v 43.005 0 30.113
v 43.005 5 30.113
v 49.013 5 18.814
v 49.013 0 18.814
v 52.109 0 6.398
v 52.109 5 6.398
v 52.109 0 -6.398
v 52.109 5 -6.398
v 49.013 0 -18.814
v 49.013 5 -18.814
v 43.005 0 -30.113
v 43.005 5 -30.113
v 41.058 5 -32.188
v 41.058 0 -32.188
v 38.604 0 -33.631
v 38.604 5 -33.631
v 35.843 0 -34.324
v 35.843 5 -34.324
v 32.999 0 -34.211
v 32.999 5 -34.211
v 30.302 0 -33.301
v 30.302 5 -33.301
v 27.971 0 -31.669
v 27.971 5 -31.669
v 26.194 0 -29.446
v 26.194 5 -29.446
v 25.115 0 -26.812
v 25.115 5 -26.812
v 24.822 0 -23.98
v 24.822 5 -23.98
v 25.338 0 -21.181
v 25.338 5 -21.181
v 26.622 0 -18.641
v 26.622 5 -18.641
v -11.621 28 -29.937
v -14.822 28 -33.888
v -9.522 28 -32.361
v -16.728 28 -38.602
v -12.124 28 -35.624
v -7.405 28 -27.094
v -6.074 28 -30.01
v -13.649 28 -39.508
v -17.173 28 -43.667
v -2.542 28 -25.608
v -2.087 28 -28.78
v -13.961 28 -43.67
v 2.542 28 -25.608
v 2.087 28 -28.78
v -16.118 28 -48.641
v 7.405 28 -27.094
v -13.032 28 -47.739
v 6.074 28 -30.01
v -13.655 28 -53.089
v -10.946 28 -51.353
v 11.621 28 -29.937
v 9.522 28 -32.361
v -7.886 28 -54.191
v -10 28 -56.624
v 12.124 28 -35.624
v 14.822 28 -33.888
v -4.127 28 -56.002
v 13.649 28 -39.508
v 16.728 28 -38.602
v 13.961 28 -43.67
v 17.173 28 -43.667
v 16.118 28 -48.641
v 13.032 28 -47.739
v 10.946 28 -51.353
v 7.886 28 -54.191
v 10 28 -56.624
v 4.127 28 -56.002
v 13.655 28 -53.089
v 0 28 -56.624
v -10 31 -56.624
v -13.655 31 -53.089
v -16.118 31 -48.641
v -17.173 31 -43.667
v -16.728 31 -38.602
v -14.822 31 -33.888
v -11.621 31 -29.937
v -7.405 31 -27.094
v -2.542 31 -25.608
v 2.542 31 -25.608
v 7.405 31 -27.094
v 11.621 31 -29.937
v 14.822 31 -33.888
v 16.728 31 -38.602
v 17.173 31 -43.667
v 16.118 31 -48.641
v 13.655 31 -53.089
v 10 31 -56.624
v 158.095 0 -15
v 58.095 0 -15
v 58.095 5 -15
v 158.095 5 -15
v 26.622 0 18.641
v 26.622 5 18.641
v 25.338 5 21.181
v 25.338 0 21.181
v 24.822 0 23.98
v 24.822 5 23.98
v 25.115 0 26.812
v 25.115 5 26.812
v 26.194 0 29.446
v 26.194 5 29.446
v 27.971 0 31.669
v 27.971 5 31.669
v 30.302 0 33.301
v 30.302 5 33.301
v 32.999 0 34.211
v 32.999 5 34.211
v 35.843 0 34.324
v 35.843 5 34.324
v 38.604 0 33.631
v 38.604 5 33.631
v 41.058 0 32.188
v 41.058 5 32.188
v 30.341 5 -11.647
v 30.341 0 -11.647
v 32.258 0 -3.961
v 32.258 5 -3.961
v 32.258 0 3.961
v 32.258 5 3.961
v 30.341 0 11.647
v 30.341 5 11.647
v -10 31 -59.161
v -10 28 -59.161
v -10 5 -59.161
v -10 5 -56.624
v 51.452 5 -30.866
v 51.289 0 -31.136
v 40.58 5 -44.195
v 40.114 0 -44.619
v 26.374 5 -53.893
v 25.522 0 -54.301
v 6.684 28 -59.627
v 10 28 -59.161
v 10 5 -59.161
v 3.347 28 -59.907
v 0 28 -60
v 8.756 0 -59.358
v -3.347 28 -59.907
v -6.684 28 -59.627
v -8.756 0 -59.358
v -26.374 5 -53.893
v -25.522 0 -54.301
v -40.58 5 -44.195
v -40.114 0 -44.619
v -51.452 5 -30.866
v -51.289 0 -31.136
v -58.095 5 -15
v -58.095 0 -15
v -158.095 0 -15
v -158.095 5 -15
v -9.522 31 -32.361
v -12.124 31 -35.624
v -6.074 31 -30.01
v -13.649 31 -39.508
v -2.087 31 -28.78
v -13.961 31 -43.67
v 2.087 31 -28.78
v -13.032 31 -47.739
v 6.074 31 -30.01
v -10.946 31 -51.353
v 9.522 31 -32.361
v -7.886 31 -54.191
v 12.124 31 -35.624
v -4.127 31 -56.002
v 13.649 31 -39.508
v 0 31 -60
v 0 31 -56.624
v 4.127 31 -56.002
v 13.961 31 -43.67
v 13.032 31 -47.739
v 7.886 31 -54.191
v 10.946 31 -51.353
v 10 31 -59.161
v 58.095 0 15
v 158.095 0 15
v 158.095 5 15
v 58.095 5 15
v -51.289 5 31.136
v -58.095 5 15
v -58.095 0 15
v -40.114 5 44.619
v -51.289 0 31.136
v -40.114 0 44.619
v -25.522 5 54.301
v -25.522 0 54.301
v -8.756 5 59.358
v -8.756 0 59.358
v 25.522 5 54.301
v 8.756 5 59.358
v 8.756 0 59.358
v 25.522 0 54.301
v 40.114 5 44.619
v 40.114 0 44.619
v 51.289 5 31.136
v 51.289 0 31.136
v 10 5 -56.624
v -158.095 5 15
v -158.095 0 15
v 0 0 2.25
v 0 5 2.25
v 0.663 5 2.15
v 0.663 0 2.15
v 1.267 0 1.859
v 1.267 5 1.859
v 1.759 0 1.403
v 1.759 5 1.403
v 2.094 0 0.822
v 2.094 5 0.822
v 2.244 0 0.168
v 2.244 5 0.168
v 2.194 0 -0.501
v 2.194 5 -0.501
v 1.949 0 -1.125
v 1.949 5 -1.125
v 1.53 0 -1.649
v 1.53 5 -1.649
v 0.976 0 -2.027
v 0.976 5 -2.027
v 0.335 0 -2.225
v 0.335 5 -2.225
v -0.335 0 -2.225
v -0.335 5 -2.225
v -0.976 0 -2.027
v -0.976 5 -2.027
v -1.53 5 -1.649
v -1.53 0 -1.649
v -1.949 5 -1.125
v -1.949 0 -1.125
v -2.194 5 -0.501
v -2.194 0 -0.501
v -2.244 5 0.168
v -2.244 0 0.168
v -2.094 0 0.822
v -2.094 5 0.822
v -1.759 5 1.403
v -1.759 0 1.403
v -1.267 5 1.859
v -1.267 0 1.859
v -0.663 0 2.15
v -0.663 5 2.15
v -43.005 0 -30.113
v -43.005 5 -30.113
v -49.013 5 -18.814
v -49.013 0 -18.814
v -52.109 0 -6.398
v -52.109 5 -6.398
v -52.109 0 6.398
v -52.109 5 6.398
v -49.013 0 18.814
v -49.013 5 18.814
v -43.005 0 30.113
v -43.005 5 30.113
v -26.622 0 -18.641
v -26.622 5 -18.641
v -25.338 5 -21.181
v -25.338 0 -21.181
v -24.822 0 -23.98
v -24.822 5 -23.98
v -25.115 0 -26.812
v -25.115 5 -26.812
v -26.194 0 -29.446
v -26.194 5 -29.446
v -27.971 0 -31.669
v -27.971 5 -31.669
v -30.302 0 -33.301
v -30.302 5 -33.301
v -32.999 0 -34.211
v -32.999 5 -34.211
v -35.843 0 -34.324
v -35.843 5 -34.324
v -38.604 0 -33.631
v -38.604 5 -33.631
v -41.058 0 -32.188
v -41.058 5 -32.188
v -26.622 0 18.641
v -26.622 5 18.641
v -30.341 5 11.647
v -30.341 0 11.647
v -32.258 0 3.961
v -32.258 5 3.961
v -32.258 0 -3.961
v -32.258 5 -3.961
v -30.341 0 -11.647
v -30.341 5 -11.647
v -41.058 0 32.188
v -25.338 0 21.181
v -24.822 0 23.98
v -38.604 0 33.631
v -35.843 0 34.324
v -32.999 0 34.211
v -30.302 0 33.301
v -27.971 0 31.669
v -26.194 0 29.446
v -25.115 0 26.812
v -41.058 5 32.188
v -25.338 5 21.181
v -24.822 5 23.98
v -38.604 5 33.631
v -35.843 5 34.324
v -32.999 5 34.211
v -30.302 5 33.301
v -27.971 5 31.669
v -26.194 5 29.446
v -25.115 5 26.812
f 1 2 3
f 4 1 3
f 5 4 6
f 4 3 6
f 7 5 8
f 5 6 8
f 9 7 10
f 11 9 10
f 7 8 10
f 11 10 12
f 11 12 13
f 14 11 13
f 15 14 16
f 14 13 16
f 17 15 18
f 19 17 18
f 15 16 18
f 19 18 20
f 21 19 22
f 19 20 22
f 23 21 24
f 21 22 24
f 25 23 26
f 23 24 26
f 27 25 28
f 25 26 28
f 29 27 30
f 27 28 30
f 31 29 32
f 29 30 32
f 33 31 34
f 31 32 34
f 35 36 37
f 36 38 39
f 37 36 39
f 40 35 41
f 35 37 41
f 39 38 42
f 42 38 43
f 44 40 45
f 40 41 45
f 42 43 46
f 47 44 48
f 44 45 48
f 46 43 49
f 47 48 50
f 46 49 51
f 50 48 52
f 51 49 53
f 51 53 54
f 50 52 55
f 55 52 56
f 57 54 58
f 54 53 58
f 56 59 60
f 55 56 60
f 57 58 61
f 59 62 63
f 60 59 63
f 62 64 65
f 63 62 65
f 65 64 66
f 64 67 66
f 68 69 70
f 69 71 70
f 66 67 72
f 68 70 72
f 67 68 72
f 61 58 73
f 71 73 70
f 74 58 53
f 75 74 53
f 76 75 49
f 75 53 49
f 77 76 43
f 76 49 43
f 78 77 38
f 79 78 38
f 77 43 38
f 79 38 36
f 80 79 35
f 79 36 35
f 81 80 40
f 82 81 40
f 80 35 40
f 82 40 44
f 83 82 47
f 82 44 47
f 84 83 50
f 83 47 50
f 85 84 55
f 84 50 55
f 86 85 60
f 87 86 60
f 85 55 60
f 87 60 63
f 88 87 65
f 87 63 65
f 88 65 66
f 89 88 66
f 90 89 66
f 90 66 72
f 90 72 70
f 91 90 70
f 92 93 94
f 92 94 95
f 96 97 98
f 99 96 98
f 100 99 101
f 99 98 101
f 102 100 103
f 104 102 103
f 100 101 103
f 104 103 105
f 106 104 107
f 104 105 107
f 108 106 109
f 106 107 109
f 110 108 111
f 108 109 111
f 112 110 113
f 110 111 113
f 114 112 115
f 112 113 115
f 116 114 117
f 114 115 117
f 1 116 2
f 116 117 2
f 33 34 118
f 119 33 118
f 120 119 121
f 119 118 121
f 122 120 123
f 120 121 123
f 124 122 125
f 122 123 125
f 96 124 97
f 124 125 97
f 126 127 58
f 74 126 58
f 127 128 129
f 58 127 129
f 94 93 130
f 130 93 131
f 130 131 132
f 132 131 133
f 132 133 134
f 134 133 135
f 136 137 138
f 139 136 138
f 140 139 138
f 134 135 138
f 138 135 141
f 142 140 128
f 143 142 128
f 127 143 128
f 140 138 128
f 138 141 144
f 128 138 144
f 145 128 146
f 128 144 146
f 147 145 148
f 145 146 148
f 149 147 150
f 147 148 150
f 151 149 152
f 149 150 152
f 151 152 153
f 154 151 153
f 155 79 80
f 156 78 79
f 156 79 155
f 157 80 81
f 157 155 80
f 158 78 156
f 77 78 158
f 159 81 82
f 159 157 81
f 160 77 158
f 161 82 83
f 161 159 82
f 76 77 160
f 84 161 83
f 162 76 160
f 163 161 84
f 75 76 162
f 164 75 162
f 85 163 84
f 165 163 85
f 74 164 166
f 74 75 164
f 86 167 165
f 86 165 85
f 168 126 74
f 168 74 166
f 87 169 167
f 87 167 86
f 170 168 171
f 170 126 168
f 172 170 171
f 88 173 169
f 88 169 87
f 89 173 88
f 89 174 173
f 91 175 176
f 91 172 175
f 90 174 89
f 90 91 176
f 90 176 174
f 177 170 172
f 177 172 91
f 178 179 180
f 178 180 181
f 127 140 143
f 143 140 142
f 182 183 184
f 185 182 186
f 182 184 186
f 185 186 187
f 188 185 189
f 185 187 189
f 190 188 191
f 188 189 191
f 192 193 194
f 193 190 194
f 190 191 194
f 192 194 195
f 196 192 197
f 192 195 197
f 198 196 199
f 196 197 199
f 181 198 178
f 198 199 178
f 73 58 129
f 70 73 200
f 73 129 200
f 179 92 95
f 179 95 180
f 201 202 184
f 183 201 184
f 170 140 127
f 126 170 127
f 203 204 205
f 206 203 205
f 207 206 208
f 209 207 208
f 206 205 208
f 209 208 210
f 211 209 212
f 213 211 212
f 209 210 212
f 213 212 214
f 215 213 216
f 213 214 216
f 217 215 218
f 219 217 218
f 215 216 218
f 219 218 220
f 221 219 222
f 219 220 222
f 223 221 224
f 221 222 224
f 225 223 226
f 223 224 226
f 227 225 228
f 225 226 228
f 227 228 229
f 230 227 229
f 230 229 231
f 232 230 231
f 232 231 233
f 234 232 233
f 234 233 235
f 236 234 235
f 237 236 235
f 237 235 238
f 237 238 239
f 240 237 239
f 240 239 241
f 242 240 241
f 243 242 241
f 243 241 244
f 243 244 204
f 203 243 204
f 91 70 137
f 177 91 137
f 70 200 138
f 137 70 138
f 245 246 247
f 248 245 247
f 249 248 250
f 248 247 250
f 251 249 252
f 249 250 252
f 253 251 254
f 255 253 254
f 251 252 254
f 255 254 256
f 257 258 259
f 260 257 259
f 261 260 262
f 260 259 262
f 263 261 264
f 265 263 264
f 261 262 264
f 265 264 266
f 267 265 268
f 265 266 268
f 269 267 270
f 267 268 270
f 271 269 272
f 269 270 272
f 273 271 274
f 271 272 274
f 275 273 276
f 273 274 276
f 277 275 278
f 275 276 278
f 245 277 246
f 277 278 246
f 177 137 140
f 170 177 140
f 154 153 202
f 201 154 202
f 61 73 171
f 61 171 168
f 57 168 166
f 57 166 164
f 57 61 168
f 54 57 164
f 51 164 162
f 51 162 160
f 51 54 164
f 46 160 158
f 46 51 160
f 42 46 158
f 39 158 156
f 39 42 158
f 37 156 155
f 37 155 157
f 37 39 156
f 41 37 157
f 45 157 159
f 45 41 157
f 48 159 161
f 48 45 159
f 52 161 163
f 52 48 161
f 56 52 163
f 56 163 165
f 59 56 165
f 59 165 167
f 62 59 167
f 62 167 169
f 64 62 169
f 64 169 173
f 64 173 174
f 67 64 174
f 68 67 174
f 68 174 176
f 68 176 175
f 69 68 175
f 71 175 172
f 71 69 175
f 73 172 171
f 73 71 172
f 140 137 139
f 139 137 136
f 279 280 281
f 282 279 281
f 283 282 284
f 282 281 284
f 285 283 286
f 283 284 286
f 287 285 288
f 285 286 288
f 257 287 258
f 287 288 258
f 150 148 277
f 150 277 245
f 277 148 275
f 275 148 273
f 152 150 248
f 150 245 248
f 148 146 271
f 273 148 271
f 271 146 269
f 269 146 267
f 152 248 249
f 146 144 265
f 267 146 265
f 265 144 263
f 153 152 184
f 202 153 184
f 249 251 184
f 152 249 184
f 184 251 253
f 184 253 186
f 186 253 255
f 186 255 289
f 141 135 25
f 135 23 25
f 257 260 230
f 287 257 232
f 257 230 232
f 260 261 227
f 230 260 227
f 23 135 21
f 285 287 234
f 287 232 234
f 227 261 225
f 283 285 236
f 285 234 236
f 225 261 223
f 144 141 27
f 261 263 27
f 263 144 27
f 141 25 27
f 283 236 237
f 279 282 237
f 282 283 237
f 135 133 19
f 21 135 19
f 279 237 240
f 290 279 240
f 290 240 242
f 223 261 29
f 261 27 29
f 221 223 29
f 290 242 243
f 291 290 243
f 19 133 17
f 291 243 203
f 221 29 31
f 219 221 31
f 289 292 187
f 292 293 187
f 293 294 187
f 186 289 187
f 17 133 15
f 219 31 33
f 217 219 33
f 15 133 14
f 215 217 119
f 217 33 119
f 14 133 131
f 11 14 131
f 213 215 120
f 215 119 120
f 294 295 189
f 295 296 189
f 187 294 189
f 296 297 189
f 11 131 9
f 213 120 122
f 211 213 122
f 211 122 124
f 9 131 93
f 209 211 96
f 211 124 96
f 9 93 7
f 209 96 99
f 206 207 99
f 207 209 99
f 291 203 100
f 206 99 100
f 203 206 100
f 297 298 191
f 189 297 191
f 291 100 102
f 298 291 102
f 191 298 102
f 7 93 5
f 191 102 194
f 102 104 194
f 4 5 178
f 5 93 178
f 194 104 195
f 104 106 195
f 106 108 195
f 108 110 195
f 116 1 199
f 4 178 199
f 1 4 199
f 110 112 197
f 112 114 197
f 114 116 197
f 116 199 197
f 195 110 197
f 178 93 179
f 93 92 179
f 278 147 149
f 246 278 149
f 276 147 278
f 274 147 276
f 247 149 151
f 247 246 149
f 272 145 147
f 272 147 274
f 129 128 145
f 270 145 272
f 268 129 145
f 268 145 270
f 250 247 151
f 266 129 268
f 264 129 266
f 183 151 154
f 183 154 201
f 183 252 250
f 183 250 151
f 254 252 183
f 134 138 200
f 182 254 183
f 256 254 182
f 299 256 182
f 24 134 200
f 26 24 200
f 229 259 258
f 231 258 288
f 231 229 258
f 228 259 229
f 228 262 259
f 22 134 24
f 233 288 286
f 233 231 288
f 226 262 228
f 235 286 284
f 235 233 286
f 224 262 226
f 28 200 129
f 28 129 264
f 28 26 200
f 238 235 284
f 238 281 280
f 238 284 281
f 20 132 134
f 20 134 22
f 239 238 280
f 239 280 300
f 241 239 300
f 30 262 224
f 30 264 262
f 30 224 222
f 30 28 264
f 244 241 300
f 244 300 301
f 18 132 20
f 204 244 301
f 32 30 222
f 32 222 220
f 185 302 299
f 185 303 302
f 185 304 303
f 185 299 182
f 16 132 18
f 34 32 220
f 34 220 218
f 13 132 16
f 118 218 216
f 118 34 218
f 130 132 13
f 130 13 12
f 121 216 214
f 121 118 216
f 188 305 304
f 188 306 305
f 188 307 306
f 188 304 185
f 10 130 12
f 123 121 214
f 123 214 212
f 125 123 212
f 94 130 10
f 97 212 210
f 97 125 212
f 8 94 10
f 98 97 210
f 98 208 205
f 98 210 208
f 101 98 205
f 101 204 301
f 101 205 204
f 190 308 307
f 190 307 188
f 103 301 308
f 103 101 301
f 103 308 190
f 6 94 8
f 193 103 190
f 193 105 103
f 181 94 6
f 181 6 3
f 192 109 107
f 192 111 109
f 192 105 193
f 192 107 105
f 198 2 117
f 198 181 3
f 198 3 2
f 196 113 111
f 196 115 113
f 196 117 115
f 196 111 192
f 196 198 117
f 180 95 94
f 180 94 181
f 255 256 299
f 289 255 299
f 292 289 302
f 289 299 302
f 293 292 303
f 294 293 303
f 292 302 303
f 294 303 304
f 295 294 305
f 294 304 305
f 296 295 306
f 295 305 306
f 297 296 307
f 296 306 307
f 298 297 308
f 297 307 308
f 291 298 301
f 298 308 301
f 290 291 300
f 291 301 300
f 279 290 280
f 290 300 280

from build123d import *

# Parameters (mm, degrees)
SKETCH1_R           = 60
BOSS_EXTRUDE1_DEPTH = 5
CUT_EXTRUDE1_DEPTH  = 5
BOSS_EXTRUDE2_DEPTH = 23
SKETCH4_R           = 2.25
CUT_EXTRUDE2_DEPTH  = 15
BOSS_EXTRUDE3_START = -5
BOSS_EXTRUDE3_DEPTH = 5
SKETCH10_R          = 14
BOSS_EXTRUDE6_DEPTH = 3


with BuildPart() as part:
    # Sketch1 → Boss-Extrude1 (new body)
    with BuildSketch(Plane(origin=(0, 0, 0), x_dir=(1, 0, 0), z_dir=(0, 1, 0))):
        with Locations(Location((0, 0, 0), (0, 0, 270))):
            Circle(SKETCH1_R)
    extrude(amount=BOSS_EXTRUDE1_DEPTH)

    # Sketch2 → Cut-Extrude1 (cut)
    with BuildSketch(Plane(origin=(0, 5, 0), x_dir=(1, 0, 0), z_dir=(0, 1, 0))):
        with BuildLine():
            ThreePointArc((-43.005482325, 30.112762908), (-52.5, 0), (-43.005482325, -30.112762908))
            ThreePointArc((-43.005482325, -30.112762908), (-29.078197519, -32.568518988), (-26.622441439, -18.641234181))
            ThreePointArc((-26.622441439, -18.641234181), (-32.5, 0), (-26.622441439, 18.641234181))
            ThreePointArc((-26.622441439, 18.641234181), (-29.078197519, 32.568518988), (-43.005482325, 30.112762908))
        make_face()
        with BuildLine():
            ThreePointArc((43.005482325, 30.112762908), (29.078197519, 32.568518988), (26.622441439, 18.641234181))
            ThreePointArc((26.622441439, 18.641234181), (32.5, 0), (26.622441439, -18.641234181))
            ThreePointArc((26.622441439, -18.641234181), (29.078197519, -32.568518988), (43.005482325, -30.112762908))
            ThreePointArc((43.005482325, -30.112762908), (52.5, 0), (43.005482325, 30.112762908))
        make_face()
    extrude(amount=-CUT_EXTRUDE1_DEPTH, mode=Mode.SUBTRACT)

    # Sketch3 → Boss-Extrude2 (add)
    with BuildSketch(Plane(origin=(0, 5, 0), x_dir=(1, 0, 0), z_dir=(0, 1, 0))):
        with BuildLine():
            Line((10, 56.623758265), (10, 59.160797831))
            ThreePointArc((10, 59.160797831), (0, 60), (-10, 59.160797831))
            Line((-10, 59.160797831), (-10, 56.623758265))
            Line((-10, 56.623758265), (10, 56.623758265))
        make_face()
    extrude(amount=BOSS_EXTRUDE2_DEPTH)

    # Sketch4 → Cut-Extrude2 (cut)
    with BuildSketch(Plane(origin=(0, 5, 0), x_dir=(1, 0, 0), z_dir=(0, 1, 0))):
        with Locations(Location((0, 0, 0), (0, 0, 270))):
            Circle(SKETCH4_R)
    extrude(amount=-CUT_EXTRUDE2_DEPTH, mode=Mode.SUBTRACT)

    # Sketch5 → Boss-Extrude3 (add)
    with BuildSketch(Plane(origin=(0, 5, 0), x_dir=(1, 0, 0), z_dir=(0, 1, 0)).offset(BOSS_EXTRUDE3_START)):
        with BuildLine():
            Line((-58.094750193, 15), (-158.094750193, 15))
            Line((-158.094750193, 15), (-158.094750193, -15))
            Line((-158.094750193, -15), (-58.094750193, -15))
            ThreePointArc((-58.094750193, -15), (-60, 0), (-58.094750193, 15))
        make_face()
    boss_extrude3 = extrude(amount=BOSS_EXTRUDE3_DEPTH)

    # Mirror1: Boss-Extrude3 across plane
    add(boss_extrude3.mirror(Plane(origin=(0, 0, 0), x_dir=(0, 0, 1), z_dir=(1, 0, 0))))

    # Sketch10 → Boss-Extrude6 (add)
    with BuildSketch(Plane(origin=(0, 28, 0), x_dir=(1, 0, 0), z_dir=(0, 1, 0))):
        with BuildLine():
            Line((-10, 59.160797831), (-10, 56.623758265))
            ThreePointArc((-10, 56.623758265), (0, 25.41910773), (10, 56.623758265))
            Line((10, 56.623758265), (10, 59.160797831))
            Line((10, 59.160797831), (0, 60))
            Line((0, 60), (-10, 59.160797831))
        make_face()
        with Locations(Location((0, 42.623758265, 0), (0, 0, 90))):
            Circle(SKETCH10_R, mode=Mode.SUBTRACT)
    extrude(amount=BOSS_EXTRUDE6_DEPTH)


solid = part.part
